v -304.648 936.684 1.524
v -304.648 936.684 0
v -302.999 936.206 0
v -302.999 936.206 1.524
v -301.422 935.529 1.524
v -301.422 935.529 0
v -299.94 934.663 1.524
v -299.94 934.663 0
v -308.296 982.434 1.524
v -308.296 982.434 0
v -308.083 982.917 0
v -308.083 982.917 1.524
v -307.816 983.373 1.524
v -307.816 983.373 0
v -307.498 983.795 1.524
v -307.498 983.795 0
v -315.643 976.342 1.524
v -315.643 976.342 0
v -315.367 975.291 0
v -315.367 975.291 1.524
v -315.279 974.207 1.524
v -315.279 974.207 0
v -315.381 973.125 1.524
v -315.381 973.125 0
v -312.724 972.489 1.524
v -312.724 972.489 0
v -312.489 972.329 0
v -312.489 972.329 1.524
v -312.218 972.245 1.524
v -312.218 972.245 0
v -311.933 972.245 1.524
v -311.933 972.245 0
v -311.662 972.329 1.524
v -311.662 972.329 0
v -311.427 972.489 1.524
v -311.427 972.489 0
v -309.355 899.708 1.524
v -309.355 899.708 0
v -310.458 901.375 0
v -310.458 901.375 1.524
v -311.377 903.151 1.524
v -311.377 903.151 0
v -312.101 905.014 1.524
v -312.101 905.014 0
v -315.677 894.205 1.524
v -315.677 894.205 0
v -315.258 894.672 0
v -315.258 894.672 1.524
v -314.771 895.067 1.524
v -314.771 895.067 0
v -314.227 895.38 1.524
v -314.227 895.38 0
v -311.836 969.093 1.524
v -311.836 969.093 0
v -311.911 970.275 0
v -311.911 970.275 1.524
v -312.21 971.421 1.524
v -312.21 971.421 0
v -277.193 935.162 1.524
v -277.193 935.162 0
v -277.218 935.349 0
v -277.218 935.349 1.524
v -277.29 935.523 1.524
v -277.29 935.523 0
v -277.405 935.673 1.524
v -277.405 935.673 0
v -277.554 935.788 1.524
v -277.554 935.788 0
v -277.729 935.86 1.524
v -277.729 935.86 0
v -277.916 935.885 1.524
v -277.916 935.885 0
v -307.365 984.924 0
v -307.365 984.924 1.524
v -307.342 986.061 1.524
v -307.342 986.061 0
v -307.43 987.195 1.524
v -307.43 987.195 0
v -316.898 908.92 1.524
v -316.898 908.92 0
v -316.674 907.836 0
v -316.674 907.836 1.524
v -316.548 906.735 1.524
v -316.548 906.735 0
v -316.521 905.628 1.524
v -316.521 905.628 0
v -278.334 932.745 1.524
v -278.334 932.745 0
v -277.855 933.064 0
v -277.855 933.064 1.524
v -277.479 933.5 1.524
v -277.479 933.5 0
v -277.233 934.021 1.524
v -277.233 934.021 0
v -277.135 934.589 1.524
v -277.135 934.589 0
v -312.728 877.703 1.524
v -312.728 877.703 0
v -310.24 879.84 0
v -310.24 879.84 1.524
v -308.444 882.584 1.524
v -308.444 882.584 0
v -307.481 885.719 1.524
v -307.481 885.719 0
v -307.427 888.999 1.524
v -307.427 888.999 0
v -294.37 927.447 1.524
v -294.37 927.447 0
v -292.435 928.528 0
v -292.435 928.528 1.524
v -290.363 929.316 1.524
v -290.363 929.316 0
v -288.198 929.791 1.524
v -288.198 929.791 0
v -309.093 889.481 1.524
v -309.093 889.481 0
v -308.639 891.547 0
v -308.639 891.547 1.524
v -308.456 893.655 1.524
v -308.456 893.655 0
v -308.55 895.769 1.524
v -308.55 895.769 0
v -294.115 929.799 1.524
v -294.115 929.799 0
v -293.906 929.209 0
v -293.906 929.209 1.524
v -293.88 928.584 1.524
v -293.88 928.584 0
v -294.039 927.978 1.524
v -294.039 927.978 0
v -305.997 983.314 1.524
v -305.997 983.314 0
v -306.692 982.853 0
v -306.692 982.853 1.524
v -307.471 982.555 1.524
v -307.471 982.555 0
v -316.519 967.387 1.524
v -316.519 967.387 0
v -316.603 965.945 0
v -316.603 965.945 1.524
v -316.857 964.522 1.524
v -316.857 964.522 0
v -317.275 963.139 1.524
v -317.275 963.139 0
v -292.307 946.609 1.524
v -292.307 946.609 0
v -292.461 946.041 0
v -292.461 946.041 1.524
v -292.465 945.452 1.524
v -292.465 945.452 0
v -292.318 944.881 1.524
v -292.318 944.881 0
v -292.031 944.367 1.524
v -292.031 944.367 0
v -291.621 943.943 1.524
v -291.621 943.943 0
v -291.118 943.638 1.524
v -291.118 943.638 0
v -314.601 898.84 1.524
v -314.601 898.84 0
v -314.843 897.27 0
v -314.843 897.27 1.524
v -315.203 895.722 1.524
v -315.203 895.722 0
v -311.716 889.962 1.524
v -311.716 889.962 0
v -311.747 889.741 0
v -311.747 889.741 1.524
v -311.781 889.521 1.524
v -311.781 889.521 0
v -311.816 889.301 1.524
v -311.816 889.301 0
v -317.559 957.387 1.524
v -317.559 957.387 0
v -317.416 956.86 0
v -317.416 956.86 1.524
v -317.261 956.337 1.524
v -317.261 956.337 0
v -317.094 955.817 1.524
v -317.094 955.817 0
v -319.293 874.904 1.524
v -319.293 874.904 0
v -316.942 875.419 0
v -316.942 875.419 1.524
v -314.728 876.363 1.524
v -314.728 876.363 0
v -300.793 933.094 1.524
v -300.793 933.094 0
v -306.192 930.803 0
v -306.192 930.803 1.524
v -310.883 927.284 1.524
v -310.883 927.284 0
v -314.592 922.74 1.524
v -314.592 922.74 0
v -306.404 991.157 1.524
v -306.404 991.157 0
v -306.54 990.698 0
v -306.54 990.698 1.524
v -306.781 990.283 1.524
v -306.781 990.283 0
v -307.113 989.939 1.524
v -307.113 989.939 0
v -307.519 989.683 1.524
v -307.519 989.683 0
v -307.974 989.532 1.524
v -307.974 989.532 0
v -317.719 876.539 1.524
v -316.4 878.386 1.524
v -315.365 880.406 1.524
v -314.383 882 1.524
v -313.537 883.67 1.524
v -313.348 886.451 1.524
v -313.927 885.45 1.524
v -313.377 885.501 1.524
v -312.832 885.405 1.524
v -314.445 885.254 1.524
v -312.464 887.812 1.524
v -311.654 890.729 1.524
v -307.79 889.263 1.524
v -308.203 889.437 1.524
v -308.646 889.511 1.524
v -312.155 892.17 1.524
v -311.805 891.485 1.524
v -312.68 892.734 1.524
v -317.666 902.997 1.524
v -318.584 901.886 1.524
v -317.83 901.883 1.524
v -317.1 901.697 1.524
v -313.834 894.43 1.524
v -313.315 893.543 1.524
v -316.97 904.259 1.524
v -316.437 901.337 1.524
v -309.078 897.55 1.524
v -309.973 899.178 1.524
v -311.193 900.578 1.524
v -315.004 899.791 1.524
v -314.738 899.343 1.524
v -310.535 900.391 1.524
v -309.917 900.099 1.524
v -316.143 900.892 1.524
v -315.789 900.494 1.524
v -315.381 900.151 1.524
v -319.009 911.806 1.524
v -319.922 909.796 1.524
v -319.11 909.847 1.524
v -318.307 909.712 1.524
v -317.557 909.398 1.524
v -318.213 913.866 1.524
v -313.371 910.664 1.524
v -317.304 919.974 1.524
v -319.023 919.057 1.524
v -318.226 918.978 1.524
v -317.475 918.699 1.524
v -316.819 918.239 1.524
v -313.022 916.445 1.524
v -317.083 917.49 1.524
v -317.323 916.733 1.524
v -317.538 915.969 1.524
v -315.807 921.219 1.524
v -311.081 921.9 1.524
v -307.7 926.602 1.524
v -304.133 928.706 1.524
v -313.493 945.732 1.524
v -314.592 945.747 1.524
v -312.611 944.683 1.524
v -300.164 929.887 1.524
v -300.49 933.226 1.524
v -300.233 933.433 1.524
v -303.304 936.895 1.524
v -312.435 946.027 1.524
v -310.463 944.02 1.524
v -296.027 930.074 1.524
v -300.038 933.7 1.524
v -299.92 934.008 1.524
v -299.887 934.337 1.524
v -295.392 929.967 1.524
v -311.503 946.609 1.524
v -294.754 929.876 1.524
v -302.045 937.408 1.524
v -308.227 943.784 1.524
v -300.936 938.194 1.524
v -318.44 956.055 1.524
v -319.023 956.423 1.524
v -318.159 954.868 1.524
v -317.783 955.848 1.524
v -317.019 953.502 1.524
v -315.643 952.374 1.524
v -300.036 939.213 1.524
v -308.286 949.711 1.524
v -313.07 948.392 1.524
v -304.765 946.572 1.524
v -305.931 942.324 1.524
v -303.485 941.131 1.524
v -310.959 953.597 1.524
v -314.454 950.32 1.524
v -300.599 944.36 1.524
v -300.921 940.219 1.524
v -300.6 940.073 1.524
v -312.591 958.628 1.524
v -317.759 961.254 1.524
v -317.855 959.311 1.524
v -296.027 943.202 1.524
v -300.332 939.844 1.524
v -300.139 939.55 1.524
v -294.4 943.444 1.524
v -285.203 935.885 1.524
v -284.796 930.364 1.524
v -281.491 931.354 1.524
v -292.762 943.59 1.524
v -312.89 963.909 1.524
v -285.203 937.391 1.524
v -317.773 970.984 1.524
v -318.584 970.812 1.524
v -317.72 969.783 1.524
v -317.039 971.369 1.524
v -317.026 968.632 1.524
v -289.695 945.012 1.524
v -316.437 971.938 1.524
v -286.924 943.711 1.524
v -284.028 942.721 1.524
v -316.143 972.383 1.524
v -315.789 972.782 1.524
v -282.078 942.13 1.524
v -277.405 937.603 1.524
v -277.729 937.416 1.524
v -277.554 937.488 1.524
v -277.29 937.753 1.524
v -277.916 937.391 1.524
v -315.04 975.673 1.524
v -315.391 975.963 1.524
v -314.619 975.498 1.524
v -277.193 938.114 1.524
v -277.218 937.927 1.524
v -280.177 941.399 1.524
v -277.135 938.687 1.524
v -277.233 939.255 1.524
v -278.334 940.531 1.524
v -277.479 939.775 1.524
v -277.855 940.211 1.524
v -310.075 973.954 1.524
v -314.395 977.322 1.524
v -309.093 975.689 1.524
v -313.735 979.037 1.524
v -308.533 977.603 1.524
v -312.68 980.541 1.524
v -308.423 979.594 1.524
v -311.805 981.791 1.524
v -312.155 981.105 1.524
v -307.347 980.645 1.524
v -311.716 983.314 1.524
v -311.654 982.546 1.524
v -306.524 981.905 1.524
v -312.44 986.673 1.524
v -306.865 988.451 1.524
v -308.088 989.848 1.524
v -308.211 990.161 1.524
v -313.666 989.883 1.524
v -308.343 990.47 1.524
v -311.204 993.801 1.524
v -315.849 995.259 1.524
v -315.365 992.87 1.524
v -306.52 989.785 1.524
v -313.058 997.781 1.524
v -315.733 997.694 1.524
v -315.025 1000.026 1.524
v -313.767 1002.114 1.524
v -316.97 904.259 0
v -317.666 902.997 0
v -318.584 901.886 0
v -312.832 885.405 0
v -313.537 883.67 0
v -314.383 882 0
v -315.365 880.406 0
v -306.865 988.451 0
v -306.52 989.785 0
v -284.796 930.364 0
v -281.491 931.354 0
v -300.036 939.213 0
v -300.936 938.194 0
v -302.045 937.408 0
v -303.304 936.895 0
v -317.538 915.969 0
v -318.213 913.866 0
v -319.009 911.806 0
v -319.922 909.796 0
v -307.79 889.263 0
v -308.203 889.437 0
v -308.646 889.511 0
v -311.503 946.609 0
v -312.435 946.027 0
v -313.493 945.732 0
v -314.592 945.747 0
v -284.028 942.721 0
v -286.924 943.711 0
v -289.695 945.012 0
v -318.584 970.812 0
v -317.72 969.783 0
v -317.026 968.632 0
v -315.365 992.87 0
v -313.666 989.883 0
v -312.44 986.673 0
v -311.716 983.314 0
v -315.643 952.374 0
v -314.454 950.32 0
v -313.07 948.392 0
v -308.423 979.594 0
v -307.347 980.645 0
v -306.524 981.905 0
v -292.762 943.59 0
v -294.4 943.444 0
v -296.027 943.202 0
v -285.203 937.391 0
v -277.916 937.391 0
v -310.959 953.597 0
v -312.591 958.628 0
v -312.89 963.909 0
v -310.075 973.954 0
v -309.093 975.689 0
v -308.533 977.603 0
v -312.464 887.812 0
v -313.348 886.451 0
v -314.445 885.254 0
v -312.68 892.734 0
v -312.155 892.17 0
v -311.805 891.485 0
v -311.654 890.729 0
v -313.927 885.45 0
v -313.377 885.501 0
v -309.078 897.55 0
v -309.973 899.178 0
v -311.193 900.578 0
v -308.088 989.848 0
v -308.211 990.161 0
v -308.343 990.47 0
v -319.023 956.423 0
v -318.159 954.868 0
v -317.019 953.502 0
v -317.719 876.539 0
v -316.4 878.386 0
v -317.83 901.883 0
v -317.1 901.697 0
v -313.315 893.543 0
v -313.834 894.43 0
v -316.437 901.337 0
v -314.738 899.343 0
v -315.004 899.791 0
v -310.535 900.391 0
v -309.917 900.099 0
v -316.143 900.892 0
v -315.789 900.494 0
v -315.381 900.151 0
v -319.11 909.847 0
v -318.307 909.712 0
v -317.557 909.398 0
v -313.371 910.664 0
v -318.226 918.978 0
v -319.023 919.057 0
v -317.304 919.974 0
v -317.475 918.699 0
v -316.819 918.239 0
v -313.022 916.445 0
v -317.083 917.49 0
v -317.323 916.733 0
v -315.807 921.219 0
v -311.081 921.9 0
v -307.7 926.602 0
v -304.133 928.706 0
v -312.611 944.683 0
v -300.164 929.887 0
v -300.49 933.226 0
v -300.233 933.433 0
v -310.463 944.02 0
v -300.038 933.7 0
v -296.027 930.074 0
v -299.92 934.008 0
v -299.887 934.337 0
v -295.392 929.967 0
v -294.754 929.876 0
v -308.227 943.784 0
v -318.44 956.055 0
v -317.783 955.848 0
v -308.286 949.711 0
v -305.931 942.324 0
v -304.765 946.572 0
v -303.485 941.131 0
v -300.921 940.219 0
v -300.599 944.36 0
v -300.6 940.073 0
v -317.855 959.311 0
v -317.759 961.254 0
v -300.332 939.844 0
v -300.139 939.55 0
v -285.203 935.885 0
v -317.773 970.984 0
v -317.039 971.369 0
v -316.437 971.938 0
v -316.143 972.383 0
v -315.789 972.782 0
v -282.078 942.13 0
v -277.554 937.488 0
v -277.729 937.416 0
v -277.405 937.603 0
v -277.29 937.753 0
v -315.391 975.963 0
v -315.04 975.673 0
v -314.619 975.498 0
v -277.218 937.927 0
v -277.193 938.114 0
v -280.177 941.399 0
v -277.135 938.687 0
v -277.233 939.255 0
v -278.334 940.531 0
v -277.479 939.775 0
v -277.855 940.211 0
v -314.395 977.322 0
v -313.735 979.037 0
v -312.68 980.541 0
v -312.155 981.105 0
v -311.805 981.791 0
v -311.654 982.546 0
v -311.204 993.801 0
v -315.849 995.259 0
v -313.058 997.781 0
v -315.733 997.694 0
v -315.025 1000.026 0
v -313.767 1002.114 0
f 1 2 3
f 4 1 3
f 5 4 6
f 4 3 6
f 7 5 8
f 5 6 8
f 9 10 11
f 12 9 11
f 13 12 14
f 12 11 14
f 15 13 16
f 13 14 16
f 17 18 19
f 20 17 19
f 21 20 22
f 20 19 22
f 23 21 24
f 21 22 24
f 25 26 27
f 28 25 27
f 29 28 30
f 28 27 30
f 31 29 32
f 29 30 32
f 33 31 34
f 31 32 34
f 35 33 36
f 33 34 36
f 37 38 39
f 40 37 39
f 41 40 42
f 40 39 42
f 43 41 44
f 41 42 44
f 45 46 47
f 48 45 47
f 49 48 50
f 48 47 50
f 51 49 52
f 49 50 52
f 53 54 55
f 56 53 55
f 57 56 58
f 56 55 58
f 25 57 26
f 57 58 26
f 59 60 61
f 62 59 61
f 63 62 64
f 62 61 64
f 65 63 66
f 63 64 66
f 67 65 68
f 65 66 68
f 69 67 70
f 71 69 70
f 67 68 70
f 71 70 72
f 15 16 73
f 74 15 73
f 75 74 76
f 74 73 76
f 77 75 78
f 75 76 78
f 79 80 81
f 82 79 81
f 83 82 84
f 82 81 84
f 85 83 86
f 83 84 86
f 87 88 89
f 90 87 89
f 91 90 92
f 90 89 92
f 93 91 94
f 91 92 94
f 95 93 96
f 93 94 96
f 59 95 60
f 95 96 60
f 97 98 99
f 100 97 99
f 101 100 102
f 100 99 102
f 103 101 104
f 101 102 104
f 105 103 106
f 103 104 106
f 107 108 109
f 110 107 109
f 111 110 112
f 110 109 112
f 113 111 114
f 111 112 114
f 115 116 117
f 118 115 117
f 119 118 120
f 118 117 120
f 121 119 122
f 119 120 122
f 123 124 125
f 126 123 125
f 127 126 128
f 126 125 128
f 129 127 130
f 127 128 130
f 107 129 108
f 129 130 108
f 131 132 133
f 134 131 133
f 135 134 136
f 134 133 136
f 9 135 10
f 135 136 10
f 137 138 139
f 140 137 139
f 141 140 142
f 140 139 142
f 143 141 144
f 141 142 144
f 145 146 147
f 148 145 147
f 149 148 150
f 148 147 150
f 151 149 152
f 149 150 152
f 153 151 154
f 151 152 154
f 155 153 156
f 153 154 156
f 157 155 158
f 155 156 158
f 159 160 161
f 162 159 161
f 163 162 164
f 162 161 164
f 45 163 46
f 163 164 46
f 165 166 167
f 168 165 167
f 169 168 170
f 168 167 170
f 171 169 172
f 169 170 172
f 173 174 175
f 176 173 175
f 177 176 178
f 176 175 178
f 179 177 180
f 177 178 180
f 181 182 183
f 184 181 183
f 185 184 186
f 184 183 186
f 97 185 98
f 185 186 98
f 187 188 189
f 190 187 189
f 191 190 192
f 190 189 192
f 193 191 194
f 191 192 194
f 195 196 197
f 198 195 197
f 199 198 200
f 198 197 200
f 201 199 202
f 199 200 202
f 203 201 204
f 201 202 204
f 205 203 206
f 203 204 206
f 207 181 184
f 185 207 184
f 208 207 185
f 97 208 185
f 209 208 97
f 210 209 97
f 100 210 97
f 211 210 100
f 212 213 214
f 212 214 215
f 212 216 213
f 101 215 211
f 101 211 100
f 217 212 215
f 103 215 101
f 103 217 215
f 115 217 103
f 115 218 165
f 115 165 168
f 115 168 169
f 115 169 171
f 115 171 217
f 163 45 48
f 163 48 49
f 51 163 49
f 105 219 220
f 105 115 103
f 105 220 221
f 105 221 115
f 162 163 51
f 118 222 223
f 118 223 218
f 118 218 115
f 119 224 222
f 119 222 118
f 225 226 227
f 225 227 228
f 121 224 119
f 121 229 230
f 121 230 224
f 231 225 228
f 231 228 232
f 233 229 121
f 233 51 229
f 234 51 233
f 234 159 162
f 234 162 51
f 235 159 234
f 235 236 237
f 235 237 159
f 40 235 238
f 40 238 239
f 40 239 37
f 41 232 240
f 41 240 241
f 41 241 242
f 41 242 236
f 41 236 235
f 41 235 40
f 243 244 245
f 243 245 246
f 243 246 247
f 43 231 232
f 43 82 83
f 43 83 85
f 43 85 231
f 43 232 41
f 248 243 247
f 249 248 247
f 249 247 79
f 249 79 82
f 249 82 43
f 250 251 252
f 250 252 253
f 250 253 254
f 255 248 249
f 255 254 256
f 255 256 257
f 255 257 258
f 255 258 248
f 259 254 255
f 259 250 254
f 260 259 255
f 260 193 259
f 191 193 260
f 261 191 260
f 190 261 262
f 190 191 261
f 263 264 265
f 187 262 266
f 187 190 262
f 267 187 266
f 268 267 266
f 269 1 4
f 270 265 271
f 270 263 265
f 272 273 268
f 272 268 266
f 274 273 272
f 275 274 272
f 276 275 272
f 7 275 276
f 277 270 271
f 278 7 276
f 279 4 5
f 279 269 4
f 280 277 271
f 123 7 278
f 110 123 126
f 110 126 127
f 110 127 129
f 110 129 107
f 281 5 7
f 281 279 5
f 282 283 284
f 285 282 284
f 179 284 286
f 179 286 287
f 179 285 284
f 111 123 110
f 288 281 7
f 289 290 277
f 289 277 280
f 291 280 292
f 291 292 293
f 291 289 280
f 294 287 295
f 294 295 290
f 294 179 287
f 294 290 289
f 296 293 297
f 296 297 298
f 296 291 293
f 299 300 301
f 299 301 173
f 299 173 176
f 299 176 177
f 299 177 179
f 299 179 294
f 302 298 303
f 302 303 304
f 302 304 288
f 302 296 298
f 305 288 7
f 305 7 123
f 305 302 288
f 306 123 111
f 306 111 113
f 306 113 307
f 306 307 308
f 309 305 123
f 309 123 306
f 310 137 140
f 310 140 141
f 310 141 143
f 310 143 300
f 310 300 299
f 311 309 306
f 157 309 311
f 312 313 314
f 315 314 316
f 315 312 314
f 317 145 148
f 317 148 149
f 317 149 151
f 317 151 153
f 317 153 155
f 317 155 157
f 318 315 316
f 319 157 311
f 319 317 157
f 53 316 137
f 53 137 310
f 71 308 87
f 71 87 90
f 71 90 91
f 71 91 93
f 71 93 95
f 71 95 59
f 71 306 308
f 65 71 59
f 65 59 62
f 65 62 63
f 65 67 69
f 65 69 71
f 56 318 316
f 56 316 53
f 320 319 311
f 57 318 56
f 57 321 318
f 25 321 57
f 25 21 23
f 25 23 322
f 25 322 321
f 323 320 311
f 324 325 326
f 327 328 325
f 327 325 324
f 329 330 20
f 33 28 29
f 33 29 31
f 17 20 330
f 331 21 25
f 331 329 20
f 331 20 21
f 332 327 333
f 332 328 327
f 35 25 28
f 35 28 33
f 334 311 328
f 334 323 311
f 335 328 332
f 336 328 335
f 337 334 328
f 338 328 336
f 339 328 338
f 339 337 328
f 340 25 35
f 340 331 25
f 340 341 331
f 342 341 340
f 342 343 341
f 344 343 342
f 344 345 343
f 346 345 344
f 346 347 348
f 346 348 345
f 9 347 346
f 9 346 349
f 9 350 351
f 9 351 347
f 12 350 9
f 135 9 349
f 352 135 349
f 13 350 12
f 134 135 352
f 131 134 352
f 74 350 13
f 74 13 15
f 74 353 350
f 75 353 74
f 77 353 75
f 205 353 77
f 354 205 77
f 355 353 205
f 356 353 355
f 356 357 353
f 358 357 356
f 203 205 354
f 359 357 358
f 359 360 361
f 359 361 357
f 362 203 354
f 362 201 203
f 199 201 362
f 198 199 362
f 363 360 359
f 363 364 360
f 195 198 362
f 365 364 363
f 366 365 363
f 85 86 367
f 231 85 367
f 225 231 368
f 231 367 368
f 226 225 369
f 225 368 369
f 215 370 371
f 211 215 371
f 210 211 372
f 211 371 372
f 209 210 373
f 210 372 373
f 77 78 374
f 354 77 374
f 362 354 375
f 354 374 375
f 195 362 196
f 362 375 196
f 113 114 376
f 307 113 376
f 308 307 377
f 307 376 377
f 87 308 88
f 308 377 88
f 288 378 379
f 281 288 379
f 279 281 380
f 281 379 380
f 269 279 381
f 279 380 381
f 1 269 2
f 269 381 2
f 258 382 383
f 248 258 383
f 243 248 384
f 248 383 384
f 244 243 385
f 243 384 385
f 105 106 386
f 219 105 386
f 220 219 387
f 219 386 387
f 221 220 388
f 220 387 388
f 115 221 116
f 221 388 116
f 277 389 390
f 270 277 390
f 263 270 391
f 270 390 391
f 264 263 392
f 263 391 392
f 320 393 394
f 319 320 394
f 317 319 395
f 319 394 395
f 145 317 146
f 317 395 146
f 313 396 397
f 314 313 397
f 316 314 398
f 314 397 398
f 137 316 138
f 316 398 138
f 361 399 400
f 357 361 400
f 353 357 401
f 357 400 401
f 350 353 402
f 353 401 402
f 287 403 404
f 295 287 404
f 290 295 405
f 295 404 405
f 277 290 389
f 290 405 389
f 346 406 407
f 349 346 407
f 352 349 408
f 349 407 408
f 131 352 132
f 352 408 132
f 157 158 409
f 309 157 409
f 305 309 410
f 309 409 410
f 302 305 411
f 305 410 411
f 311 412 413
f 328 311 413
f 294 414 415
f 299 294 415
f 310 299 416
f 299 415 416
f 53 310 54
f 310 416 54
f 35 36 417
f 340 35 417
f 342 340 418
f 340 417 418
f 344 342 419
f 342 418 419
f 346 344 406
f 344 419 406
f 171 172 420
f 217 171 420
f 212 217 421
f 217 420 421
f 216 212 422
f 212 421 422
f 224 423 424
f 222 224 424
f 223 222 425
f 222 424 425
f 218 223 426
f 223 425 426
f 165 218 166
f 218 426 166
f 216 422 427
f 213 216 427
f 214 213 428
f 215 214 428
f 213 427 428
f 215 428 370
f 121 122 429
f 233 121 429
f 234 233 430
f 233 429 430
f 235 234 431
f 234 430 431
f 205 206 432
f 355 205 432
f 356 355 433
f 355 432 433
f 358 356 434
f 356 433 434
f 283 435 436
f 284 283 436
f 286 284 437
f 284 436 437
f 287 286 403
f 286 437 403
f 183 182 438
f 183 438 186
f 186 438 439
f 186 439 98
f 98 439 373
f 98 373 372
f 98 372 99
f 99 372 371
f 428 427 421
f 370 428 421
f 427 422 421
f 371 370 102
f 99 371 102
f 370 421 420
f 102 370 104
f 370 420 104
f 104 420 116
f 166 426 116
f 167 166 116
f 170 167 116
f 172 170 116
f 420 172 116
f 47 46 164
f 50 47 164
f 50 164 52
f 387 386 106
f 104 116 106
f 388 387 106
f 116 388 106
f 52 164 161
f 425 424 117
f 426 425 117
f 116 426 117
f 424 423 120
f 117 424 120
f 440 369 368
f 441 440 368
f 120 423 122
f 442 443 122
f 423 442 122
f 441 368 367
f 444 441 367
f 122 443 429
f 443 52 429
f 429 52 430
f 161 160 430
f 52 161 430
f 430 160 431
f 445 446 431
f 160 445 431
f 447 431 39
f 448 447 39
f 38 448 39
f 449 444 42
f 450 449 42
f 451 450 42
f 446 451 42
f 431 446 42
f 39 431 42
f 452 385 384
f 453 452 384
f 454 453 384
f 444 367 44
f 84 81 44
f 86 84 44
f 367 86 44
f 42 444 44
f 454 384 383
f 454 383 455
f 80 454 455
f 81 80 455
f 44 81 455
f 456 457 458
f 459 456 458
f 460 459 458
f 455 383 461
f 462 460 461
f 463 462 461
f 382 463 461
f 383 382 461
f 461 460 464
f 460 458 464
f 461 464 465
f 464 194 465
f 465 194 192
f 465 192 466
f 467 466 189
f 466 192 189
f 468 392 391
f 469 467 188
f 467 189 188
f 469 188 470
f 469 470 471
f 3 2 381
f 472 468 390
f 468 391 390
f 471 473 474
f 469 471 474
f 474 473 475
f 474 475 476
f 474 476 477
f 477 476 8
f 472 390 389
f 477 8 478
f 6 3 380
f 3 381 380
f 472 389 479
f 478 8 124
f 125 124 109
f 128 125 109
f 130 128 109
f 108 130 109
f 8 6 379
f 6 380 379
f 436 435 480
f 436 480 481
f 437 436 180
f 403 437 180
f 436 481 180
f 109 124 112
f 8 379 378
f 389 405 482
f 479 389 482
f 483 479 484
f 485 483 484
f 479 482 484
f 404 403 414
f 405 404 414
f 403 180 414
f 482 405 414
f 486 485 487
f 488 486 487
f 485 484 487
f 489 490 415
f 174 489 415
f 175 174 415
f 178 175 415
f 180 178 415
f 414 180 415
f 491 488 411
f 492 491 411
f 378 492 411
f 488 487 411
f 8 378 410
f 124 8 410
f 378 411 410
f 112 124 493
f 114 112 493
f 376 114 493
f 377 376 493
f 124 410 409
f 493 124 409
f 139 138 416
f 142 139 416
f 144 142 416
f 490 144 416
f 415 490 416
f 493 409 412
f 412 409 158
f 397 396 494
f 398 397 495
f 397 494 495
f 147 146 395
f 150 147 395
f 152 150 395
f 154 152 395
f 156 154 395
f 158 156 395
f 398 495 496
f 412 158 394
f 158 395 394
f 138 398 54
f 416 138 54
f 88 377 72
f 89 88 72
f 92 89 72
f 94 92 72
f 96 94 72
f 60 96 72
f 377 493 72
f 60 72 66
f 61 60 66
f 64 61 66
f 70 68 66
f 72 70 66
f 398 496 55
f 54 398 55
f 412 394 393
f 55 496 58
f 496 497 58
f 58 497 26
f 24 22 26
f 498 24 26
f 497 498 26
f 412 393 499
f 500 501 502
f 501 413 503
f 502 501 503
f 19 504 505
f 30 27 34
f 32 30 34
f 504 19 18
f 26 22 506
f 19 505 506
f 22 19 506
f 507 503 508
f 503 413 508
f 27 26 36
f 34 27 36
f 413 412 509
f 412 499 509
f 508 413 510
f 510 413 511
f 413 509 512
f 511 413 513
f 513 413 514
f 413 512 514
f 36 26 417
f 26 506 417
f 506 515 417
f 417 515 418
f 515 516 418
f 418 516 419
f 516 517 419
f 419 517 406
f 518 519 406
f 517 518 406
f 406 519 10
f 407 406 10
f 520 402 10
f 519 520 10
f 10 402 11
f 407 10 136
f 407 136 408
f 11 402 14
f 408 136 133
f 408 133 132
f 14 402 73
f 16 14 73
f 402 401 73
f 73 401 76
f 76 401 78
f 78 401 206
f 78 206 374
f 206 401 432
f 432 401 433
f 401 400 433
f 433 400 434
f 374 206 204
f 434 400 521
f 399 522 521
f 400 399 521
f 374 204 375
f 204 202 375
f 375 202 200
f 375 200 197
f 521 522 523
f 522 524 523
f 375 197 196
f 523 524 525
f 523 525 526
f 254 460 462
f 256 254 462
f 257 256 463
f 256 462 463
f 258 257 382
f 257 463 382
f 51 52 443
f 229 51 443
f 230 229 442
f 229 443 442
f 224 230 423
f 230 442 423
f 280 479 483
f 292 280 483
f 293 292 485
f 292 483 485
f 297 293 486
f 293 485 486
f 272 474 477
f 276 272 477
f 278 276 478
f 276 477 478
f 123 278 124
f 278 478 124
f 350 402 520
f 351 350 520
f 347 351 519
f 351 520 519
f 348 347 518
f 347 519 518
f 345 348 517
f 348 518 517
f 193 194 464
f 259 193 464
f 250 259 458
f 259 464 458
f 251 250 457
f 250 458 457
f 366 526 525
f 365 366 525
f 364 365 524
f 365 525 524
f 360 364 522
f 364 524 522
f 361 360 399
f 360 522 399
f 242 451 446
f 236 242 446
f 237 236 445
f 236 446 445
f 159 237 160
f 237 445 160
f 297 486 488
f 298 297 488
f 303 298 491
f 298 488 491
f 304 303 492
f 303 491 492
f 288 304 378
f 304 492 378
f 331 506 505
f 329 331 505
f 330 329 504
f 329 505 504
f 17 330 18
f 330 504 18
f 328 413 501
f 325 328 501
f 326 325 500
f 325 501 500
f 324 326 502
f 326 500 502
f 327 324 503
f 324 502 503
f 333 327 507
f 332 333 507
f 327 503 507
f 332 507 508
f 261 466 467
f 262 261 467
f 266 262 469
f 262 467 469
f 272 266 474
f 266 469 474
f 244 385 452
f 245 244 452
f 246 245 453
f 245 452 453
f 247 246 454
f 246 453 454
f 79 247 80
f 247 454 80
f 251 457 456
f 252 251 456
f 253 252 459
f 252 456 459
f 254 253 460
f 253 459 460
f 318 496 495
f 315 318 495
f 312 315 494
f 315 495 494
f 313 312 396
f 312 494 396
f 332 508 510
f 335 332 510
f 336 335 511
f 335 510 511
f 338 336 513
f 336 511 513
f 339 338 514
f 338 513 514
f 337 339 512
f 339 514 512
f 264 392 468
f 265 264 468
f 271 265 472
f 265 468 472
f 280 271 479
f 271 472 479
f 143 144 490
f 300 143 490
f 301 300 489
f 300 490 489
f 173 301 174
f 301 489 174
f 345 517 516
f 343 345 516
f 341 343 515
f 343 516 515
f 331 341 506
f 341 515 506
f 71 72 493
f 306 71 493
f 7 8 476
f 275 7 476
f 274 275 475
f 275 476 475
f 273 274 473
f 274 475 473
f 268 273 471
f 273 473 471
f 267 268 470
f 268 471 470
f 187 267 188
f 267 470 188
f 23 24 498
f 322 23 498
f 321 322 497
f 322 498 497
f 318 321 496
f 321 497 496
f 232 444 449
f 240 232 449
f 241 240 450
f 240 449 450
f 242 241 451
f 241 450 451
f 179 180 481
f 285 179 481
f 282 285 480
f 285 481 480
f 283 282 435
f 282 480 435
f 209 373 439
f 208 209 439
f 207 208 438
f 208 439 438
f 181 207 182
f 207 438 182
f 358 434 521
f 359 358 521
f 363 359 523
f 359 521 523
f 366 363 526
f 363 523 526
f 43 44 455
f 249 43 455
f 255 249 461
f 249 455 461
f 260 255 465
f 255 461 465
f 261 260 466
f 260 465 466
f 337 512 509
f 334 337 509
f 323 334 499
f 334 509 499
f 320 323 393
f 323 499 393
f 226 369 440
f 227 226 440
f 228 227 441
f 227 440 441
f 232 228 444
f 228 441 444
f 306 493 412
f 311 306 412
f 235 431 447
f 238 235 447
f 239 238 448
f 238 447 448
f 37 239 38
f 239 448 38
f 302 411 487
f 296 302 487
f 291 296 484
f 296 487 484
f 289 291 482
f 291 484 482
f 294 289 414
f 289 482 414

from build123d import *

# Parameters (mm, degrees)
BOSS_EXTRUDE1_DEPTH = 1.524


with BuildPart() as part:
    # Sketch1 → Boss-Extrude1 (new body)
    with BuildSketch(Plane.XY):
        with BuildLine():
            Line((-277.916022261, 935.884590671), (-285.203156616, 935.884606348))
            Line((-285.203156616, 935.884606348), (-285.203156616, 937.391012124))
            Line((-285.203156616, 937.391012124), (-277.916022261, 937.391027801))
            ThreePointArc((-277.916022261, 937.391027801), (-277.404732191, 937.602812049), (-277.192949044, 938.114102574))
            ThreePointArc((-277.192949044, 938.114102574), (-277.338273323, 939.523325046), (-278.333966376, 940.531106008))
            ThreePointArc((-278.333966376, 940.531106008), (-281.120669571, 941.782213098), (-284.027620805, 942.720625679))
            ThreePointArc((-284.027620805, 942.720625679), (-288.327575015, 944.323536073), (-292.30676806, 946.609351169))
            ThreePointArc((-292.30676806, 946.609351169), (-292.318053521, 944.881271306), (-291.117622598, 943.638149038))
            ThreePointArc((-291.117622598, 943.638149038), (-293.581810552, 943.528926691), (-296.026671847, 943.202116281))
            ThreePointArc((-296.026671847, 943.202116281), (-304.765117762, 946.571977556), (-310.958943201, 953.597141502))
            ThreePointArc((-310.958943201, 953.597141502), (-312.909914326, 961.259205892), (-311.83641056, 969.092539073))
            ThreePointArc((-311.83641056, 969.092539073), (-312.032754546, 970.855390285), (-312.723616891, 972.489068521))
            ThreePointArc((-312.723616891, 972.489068521), (-312.075442701, 972.234238525), (-311.427268511, 972.489068521))
            ThreePointArc((-311.427268511, 972.489068521), (-309.093003832, 975.689484265), (-308.423499884, 979.593740531))
            ThreePointArc((-308.423499884, 979.593740531), (-306.900843126, 981.252159973), (-305.996550373, 983.313977924))
            ThreePointArc((-305.996550373, 983.313977924), (-307.073192817, 982.682922072), (-308.296117566, 982.434234514))
            ThreePointArc((-308.296117566, 982.434234514), (-307.955705891, 983.149057367), (-307.497960974, 983.795061554))
            ThreePointArc((-307.497960974, 983.795061554), (-307.339448033, 985.49236907), (-307.429564156, 987.194678748))
            ThreePointArc((-307.429564156, 987.194678748), (-306.664530959, 989.110784639), (-306.404290892, 991.157492406))
            ThreePointArc((-306.404290892, 991.157492406), (-306.936605496, 990.101048934), (-307.973845227, 989.532220851))
            ThreePointArc((-307.973845227, 989.532220851), (-308.148188947, 990.005120957), (-308.342762435, 990.47006332))
            ThreePointArc((-308.342762435, 990.47006332), (-312.267081574, 995.727304596), (-313.766747643, 1002.113999219))
            ThreePointArc((-313.766747643, 1002.113999219), (-315.73298932, 997.693682682), (-315.365124744, 992.869785889))
            ThreePointArc((-315.365124744, 992.869785889), (-312.991611752, 988.301516567), (-311.716030786, 983.313977924))
            ThreePointArc((-311.716030786, 983.313977924), (-311.804694988, 981.790848195), (-312.68001538, 980.541208357))
            ThreePointArc((-312.68001538, 980.541208357), (-314.117806981, 978.199671225), (-314.619350909, 975.498098624))
            ThreePointArc((-314.619350909, 975.498098624), (-315.225884586, 975.805286829), (-315.64332213, 976.341937173))
            ThreePointArc((-315.64332213, 976.341937173), (-315.299209722, 974.750720167), (-315.381025476, 973.124777027))
            ThreePointArc((-315.381025476, 973.124777027), (-315.973449697, 972.588843997), (-316.436986467, 971.938210203))
            ThreePointArc((-316.436986467, 971.938210203), (-317.393086767, 971.150910263), (-318.584467297, 970.812411499))
            ThreePointArc((-318.584467297, 970.812411499), (-317.350697798, 969.220806246), (-316.518624321, 967.386944694))
            ThreePointArc((-316.518624321, 967.386944694), (-316.709257262, 965.229666664), (-317.275247771, 963.139249442))
            ThreePointArc((-317.275247771, 963.139249442), (-317.856536979, 960.284878164), (-317.558763157, 957.387178511))
            ThreePointArc((-317.558763157, 957.387178511), (-317.339657536, 956.598381541), (-317.094041757, 955.817432873))
            ThreePointArc((-317.094041757, 955.817432873), (-318.118043569, 955.930405975), (-319.022729617, 956.423240417))
            ThreePointArc((-319.022729617, 956.423240417), (-317.621338919, 954.158054516), (-315.64332213, 952.374122723))
            ThreePointArc((-315.64332213, 952.374122723), (-313.785435132, 949.339402014), (-311.503309748, 946.609351169))
            ThreePointArc((-311.503309748, 946.609351169), (-312.953347628, 945.841313107), (-314.591537057, 945.747357192))
            ThreePointArc((-314.591537057, 945.747357192), (-311.553116659, 944.299676635), (-308.227229789, 943.78367854))
            ThreePointArc((-308.227229789, 943.78367854), (-304.724383034, 941.692906178), (-300.920541819, 940.219116344))
            ThreePointArc((-300.920541819, 940.219116344), (-300.33247451, 939.844426317), (-300.035650029, 939.213465936))
            ThreePointArc((-300.035650029, 939.213465936), (-302.045043086, 937.407911663), (-304.647627414, 936.683866421))
            ThreePointArc((-304.647627414, 936.683866421), (-302.200371512, 935.891549854), (-299.94034594, 934.663090898))
            ThreePointArc((-299.94034594, 934.663090898), (-300.038049245, 933.69975054), (-300.79307234, 933.093523928))
            ThreePointArc((-300.79307234, 933.093523928), (-308.644427917, 929.185810881), (-314.591537057, 922.740200085))
            ThreePointArc((-314.591537057, 922.740200085), (-316.523960255, 920.558055545), (-319.022728662, 919.057332166))
            ThreePointArc((-319.022728662, 919.057332166), (-317.841309798, 918.862286718), (-316.819146135, 918.238608351))
            ThreePointArc((-316.819146135, 918.238608351), (-317.206321698, 917.112560154), (-317.537734191, 915.968857736))
            ThreePointArc((-317.537734191, 915.968857736), (-318.596134624, 912.830665778), (-319.922253722, 909.795889281))
            ThreePointArc((-319.922253722, 909.795889281), (-318.307455112, 909.712246343), (-316.897931891, 908.919898577))
            ThreePointArc((-316.897931891, 908.919898577), (-316.598343369, 907.286884178), (-316.521377997, 905.628401245))
            ThreePointArc((-316.521377997, 905.628401245), (-317.288501726, 903.611397757), (-318.584467297, 901.885925322))
            ThreePointArc((-318.584467297, 901.885925322), (-317.459455632, 901.812397156), (-316.436986467, 901.337408268))
            ThreePointArc((-316.436986467, 901.337408268), (-315.973449697, 900.686774475), (-315.381025476, 900.150841445))
            ThreePointArc((-315.381025476, 900.150841445), (-314.855793688, 899.575963976), (-314.600768516, 898.84022306))
            ThreePointArc((-314.600768516, 898.84022306), (-315.008341261, 896.492487869), (-315.677043026, 894.205390577))
            ThreePointArc((-315.677043026, 894.205390577), (-315.022224116, 894.879239219), (-314.227435144, 895.380408141))
            ThreePointArc((-314.227435144, 895.380408141), (-313.589841267, 893.977791631), (-312.679998267, 892.734391155))
            ThreePointArc((-312.679998267, 892.734391155), (-311.804692825, 891.484757082), (-311.716030786, 889.961640548))
            ThreePointArc((-311.716030786, 889.961640548), (-311.763791905, 889.630867843), (-311.816449784, 889.300839277))
            ThreePointArc((-311.816449784, 889.300839277), (-312.878083338, 887.113343117), (-314.444692648, 885.253789266))
            ThreePointArc((-314.444692648, 885.253789266), (-313.65384255, 885.493842794), (-312.832184374, 885.404694518))
            ThreePointArc((-312.832184374, 885.404694518), (-313.94276822, 882.826275412), (-315.365124744, 880.405832583))
            ThreePointArc((-315.365124744, 880.405832583), (-317.025672215, 877.438104616), (-319.293323049, 874.903822293))
            ThreePointArc((-319.293323049, 874.903822293), (-315.812908434, 875.83934739), (-312.728096674, 877.702792989))
            ThreePointArc((-312.728096674, 877.702792989), (-308.443902691, 882.584048211), (-307.427457693, 888.998704102))
            ThreePointArc((-307.427457693, 888.998704102), (-308.20314369, 889.43695462), (-309.093003832, 889.480557515))
            ThreePointArc((-309.093003832, 889.480557515), (-308.513125406, 892.598000293), (-308.54961586, 895.768706352))
            ThreePointArc((-308.54961586, 895.768706352), (-309.481516734, 898.387713723), (-311.193435925, 900.577912695))
            ThreePointArc((-311.193435925, 900.577912695), (-310.219823691, 900.257804208), (-309.354771115, 899.708191378))
            ThreePointArc((-309.354771115, 899.708191378), (-310.941483354, 902.250655609), (-312.100693339, 905.014351016))
            ThreePointArc((-312.100693339, 905.014351016), (-313.022128407, 916.44457007), (-307.699732777, 926.601885411))
            ThreePointArc((-307.699732777, 926.601885411), (-302.18443266, 929.41780767), (-296.026671847, 930.073502191))
            ThreePointArc((-296.026671847, 930.073502191), (-295.073187001, 929.919785137), (-294.114945931, 929.799218415))
            ThreePointArc((-294.114945931, 929.799218415), (-293.879713809, 928.583729022), (-294.369589284, 927.446728303))
            ThreePointArc((-294.369589284, 927.446728303), (-291.413219904, 928.960043614), (-288.197659122, 929.790953956))
            ThreePointArc((-288.197659122, 929.790953956), (-283.128142335, 930.80796962), (-278.333966376, 932.744512464))
            ThreePointArc((-278.333966376, 932.744512464), (-277.338273323, 933.752293426), (-277.192949044, 935.161515898))
            ThreePointArc((-277.192949044, 935.161515898), (-277.404732191, 935.672806423), (-277.916022261, 935.884590671))
        make_face()
    extrude(amount=BOSS_EXTRUDE1_DEPTH)


solid = part.part
